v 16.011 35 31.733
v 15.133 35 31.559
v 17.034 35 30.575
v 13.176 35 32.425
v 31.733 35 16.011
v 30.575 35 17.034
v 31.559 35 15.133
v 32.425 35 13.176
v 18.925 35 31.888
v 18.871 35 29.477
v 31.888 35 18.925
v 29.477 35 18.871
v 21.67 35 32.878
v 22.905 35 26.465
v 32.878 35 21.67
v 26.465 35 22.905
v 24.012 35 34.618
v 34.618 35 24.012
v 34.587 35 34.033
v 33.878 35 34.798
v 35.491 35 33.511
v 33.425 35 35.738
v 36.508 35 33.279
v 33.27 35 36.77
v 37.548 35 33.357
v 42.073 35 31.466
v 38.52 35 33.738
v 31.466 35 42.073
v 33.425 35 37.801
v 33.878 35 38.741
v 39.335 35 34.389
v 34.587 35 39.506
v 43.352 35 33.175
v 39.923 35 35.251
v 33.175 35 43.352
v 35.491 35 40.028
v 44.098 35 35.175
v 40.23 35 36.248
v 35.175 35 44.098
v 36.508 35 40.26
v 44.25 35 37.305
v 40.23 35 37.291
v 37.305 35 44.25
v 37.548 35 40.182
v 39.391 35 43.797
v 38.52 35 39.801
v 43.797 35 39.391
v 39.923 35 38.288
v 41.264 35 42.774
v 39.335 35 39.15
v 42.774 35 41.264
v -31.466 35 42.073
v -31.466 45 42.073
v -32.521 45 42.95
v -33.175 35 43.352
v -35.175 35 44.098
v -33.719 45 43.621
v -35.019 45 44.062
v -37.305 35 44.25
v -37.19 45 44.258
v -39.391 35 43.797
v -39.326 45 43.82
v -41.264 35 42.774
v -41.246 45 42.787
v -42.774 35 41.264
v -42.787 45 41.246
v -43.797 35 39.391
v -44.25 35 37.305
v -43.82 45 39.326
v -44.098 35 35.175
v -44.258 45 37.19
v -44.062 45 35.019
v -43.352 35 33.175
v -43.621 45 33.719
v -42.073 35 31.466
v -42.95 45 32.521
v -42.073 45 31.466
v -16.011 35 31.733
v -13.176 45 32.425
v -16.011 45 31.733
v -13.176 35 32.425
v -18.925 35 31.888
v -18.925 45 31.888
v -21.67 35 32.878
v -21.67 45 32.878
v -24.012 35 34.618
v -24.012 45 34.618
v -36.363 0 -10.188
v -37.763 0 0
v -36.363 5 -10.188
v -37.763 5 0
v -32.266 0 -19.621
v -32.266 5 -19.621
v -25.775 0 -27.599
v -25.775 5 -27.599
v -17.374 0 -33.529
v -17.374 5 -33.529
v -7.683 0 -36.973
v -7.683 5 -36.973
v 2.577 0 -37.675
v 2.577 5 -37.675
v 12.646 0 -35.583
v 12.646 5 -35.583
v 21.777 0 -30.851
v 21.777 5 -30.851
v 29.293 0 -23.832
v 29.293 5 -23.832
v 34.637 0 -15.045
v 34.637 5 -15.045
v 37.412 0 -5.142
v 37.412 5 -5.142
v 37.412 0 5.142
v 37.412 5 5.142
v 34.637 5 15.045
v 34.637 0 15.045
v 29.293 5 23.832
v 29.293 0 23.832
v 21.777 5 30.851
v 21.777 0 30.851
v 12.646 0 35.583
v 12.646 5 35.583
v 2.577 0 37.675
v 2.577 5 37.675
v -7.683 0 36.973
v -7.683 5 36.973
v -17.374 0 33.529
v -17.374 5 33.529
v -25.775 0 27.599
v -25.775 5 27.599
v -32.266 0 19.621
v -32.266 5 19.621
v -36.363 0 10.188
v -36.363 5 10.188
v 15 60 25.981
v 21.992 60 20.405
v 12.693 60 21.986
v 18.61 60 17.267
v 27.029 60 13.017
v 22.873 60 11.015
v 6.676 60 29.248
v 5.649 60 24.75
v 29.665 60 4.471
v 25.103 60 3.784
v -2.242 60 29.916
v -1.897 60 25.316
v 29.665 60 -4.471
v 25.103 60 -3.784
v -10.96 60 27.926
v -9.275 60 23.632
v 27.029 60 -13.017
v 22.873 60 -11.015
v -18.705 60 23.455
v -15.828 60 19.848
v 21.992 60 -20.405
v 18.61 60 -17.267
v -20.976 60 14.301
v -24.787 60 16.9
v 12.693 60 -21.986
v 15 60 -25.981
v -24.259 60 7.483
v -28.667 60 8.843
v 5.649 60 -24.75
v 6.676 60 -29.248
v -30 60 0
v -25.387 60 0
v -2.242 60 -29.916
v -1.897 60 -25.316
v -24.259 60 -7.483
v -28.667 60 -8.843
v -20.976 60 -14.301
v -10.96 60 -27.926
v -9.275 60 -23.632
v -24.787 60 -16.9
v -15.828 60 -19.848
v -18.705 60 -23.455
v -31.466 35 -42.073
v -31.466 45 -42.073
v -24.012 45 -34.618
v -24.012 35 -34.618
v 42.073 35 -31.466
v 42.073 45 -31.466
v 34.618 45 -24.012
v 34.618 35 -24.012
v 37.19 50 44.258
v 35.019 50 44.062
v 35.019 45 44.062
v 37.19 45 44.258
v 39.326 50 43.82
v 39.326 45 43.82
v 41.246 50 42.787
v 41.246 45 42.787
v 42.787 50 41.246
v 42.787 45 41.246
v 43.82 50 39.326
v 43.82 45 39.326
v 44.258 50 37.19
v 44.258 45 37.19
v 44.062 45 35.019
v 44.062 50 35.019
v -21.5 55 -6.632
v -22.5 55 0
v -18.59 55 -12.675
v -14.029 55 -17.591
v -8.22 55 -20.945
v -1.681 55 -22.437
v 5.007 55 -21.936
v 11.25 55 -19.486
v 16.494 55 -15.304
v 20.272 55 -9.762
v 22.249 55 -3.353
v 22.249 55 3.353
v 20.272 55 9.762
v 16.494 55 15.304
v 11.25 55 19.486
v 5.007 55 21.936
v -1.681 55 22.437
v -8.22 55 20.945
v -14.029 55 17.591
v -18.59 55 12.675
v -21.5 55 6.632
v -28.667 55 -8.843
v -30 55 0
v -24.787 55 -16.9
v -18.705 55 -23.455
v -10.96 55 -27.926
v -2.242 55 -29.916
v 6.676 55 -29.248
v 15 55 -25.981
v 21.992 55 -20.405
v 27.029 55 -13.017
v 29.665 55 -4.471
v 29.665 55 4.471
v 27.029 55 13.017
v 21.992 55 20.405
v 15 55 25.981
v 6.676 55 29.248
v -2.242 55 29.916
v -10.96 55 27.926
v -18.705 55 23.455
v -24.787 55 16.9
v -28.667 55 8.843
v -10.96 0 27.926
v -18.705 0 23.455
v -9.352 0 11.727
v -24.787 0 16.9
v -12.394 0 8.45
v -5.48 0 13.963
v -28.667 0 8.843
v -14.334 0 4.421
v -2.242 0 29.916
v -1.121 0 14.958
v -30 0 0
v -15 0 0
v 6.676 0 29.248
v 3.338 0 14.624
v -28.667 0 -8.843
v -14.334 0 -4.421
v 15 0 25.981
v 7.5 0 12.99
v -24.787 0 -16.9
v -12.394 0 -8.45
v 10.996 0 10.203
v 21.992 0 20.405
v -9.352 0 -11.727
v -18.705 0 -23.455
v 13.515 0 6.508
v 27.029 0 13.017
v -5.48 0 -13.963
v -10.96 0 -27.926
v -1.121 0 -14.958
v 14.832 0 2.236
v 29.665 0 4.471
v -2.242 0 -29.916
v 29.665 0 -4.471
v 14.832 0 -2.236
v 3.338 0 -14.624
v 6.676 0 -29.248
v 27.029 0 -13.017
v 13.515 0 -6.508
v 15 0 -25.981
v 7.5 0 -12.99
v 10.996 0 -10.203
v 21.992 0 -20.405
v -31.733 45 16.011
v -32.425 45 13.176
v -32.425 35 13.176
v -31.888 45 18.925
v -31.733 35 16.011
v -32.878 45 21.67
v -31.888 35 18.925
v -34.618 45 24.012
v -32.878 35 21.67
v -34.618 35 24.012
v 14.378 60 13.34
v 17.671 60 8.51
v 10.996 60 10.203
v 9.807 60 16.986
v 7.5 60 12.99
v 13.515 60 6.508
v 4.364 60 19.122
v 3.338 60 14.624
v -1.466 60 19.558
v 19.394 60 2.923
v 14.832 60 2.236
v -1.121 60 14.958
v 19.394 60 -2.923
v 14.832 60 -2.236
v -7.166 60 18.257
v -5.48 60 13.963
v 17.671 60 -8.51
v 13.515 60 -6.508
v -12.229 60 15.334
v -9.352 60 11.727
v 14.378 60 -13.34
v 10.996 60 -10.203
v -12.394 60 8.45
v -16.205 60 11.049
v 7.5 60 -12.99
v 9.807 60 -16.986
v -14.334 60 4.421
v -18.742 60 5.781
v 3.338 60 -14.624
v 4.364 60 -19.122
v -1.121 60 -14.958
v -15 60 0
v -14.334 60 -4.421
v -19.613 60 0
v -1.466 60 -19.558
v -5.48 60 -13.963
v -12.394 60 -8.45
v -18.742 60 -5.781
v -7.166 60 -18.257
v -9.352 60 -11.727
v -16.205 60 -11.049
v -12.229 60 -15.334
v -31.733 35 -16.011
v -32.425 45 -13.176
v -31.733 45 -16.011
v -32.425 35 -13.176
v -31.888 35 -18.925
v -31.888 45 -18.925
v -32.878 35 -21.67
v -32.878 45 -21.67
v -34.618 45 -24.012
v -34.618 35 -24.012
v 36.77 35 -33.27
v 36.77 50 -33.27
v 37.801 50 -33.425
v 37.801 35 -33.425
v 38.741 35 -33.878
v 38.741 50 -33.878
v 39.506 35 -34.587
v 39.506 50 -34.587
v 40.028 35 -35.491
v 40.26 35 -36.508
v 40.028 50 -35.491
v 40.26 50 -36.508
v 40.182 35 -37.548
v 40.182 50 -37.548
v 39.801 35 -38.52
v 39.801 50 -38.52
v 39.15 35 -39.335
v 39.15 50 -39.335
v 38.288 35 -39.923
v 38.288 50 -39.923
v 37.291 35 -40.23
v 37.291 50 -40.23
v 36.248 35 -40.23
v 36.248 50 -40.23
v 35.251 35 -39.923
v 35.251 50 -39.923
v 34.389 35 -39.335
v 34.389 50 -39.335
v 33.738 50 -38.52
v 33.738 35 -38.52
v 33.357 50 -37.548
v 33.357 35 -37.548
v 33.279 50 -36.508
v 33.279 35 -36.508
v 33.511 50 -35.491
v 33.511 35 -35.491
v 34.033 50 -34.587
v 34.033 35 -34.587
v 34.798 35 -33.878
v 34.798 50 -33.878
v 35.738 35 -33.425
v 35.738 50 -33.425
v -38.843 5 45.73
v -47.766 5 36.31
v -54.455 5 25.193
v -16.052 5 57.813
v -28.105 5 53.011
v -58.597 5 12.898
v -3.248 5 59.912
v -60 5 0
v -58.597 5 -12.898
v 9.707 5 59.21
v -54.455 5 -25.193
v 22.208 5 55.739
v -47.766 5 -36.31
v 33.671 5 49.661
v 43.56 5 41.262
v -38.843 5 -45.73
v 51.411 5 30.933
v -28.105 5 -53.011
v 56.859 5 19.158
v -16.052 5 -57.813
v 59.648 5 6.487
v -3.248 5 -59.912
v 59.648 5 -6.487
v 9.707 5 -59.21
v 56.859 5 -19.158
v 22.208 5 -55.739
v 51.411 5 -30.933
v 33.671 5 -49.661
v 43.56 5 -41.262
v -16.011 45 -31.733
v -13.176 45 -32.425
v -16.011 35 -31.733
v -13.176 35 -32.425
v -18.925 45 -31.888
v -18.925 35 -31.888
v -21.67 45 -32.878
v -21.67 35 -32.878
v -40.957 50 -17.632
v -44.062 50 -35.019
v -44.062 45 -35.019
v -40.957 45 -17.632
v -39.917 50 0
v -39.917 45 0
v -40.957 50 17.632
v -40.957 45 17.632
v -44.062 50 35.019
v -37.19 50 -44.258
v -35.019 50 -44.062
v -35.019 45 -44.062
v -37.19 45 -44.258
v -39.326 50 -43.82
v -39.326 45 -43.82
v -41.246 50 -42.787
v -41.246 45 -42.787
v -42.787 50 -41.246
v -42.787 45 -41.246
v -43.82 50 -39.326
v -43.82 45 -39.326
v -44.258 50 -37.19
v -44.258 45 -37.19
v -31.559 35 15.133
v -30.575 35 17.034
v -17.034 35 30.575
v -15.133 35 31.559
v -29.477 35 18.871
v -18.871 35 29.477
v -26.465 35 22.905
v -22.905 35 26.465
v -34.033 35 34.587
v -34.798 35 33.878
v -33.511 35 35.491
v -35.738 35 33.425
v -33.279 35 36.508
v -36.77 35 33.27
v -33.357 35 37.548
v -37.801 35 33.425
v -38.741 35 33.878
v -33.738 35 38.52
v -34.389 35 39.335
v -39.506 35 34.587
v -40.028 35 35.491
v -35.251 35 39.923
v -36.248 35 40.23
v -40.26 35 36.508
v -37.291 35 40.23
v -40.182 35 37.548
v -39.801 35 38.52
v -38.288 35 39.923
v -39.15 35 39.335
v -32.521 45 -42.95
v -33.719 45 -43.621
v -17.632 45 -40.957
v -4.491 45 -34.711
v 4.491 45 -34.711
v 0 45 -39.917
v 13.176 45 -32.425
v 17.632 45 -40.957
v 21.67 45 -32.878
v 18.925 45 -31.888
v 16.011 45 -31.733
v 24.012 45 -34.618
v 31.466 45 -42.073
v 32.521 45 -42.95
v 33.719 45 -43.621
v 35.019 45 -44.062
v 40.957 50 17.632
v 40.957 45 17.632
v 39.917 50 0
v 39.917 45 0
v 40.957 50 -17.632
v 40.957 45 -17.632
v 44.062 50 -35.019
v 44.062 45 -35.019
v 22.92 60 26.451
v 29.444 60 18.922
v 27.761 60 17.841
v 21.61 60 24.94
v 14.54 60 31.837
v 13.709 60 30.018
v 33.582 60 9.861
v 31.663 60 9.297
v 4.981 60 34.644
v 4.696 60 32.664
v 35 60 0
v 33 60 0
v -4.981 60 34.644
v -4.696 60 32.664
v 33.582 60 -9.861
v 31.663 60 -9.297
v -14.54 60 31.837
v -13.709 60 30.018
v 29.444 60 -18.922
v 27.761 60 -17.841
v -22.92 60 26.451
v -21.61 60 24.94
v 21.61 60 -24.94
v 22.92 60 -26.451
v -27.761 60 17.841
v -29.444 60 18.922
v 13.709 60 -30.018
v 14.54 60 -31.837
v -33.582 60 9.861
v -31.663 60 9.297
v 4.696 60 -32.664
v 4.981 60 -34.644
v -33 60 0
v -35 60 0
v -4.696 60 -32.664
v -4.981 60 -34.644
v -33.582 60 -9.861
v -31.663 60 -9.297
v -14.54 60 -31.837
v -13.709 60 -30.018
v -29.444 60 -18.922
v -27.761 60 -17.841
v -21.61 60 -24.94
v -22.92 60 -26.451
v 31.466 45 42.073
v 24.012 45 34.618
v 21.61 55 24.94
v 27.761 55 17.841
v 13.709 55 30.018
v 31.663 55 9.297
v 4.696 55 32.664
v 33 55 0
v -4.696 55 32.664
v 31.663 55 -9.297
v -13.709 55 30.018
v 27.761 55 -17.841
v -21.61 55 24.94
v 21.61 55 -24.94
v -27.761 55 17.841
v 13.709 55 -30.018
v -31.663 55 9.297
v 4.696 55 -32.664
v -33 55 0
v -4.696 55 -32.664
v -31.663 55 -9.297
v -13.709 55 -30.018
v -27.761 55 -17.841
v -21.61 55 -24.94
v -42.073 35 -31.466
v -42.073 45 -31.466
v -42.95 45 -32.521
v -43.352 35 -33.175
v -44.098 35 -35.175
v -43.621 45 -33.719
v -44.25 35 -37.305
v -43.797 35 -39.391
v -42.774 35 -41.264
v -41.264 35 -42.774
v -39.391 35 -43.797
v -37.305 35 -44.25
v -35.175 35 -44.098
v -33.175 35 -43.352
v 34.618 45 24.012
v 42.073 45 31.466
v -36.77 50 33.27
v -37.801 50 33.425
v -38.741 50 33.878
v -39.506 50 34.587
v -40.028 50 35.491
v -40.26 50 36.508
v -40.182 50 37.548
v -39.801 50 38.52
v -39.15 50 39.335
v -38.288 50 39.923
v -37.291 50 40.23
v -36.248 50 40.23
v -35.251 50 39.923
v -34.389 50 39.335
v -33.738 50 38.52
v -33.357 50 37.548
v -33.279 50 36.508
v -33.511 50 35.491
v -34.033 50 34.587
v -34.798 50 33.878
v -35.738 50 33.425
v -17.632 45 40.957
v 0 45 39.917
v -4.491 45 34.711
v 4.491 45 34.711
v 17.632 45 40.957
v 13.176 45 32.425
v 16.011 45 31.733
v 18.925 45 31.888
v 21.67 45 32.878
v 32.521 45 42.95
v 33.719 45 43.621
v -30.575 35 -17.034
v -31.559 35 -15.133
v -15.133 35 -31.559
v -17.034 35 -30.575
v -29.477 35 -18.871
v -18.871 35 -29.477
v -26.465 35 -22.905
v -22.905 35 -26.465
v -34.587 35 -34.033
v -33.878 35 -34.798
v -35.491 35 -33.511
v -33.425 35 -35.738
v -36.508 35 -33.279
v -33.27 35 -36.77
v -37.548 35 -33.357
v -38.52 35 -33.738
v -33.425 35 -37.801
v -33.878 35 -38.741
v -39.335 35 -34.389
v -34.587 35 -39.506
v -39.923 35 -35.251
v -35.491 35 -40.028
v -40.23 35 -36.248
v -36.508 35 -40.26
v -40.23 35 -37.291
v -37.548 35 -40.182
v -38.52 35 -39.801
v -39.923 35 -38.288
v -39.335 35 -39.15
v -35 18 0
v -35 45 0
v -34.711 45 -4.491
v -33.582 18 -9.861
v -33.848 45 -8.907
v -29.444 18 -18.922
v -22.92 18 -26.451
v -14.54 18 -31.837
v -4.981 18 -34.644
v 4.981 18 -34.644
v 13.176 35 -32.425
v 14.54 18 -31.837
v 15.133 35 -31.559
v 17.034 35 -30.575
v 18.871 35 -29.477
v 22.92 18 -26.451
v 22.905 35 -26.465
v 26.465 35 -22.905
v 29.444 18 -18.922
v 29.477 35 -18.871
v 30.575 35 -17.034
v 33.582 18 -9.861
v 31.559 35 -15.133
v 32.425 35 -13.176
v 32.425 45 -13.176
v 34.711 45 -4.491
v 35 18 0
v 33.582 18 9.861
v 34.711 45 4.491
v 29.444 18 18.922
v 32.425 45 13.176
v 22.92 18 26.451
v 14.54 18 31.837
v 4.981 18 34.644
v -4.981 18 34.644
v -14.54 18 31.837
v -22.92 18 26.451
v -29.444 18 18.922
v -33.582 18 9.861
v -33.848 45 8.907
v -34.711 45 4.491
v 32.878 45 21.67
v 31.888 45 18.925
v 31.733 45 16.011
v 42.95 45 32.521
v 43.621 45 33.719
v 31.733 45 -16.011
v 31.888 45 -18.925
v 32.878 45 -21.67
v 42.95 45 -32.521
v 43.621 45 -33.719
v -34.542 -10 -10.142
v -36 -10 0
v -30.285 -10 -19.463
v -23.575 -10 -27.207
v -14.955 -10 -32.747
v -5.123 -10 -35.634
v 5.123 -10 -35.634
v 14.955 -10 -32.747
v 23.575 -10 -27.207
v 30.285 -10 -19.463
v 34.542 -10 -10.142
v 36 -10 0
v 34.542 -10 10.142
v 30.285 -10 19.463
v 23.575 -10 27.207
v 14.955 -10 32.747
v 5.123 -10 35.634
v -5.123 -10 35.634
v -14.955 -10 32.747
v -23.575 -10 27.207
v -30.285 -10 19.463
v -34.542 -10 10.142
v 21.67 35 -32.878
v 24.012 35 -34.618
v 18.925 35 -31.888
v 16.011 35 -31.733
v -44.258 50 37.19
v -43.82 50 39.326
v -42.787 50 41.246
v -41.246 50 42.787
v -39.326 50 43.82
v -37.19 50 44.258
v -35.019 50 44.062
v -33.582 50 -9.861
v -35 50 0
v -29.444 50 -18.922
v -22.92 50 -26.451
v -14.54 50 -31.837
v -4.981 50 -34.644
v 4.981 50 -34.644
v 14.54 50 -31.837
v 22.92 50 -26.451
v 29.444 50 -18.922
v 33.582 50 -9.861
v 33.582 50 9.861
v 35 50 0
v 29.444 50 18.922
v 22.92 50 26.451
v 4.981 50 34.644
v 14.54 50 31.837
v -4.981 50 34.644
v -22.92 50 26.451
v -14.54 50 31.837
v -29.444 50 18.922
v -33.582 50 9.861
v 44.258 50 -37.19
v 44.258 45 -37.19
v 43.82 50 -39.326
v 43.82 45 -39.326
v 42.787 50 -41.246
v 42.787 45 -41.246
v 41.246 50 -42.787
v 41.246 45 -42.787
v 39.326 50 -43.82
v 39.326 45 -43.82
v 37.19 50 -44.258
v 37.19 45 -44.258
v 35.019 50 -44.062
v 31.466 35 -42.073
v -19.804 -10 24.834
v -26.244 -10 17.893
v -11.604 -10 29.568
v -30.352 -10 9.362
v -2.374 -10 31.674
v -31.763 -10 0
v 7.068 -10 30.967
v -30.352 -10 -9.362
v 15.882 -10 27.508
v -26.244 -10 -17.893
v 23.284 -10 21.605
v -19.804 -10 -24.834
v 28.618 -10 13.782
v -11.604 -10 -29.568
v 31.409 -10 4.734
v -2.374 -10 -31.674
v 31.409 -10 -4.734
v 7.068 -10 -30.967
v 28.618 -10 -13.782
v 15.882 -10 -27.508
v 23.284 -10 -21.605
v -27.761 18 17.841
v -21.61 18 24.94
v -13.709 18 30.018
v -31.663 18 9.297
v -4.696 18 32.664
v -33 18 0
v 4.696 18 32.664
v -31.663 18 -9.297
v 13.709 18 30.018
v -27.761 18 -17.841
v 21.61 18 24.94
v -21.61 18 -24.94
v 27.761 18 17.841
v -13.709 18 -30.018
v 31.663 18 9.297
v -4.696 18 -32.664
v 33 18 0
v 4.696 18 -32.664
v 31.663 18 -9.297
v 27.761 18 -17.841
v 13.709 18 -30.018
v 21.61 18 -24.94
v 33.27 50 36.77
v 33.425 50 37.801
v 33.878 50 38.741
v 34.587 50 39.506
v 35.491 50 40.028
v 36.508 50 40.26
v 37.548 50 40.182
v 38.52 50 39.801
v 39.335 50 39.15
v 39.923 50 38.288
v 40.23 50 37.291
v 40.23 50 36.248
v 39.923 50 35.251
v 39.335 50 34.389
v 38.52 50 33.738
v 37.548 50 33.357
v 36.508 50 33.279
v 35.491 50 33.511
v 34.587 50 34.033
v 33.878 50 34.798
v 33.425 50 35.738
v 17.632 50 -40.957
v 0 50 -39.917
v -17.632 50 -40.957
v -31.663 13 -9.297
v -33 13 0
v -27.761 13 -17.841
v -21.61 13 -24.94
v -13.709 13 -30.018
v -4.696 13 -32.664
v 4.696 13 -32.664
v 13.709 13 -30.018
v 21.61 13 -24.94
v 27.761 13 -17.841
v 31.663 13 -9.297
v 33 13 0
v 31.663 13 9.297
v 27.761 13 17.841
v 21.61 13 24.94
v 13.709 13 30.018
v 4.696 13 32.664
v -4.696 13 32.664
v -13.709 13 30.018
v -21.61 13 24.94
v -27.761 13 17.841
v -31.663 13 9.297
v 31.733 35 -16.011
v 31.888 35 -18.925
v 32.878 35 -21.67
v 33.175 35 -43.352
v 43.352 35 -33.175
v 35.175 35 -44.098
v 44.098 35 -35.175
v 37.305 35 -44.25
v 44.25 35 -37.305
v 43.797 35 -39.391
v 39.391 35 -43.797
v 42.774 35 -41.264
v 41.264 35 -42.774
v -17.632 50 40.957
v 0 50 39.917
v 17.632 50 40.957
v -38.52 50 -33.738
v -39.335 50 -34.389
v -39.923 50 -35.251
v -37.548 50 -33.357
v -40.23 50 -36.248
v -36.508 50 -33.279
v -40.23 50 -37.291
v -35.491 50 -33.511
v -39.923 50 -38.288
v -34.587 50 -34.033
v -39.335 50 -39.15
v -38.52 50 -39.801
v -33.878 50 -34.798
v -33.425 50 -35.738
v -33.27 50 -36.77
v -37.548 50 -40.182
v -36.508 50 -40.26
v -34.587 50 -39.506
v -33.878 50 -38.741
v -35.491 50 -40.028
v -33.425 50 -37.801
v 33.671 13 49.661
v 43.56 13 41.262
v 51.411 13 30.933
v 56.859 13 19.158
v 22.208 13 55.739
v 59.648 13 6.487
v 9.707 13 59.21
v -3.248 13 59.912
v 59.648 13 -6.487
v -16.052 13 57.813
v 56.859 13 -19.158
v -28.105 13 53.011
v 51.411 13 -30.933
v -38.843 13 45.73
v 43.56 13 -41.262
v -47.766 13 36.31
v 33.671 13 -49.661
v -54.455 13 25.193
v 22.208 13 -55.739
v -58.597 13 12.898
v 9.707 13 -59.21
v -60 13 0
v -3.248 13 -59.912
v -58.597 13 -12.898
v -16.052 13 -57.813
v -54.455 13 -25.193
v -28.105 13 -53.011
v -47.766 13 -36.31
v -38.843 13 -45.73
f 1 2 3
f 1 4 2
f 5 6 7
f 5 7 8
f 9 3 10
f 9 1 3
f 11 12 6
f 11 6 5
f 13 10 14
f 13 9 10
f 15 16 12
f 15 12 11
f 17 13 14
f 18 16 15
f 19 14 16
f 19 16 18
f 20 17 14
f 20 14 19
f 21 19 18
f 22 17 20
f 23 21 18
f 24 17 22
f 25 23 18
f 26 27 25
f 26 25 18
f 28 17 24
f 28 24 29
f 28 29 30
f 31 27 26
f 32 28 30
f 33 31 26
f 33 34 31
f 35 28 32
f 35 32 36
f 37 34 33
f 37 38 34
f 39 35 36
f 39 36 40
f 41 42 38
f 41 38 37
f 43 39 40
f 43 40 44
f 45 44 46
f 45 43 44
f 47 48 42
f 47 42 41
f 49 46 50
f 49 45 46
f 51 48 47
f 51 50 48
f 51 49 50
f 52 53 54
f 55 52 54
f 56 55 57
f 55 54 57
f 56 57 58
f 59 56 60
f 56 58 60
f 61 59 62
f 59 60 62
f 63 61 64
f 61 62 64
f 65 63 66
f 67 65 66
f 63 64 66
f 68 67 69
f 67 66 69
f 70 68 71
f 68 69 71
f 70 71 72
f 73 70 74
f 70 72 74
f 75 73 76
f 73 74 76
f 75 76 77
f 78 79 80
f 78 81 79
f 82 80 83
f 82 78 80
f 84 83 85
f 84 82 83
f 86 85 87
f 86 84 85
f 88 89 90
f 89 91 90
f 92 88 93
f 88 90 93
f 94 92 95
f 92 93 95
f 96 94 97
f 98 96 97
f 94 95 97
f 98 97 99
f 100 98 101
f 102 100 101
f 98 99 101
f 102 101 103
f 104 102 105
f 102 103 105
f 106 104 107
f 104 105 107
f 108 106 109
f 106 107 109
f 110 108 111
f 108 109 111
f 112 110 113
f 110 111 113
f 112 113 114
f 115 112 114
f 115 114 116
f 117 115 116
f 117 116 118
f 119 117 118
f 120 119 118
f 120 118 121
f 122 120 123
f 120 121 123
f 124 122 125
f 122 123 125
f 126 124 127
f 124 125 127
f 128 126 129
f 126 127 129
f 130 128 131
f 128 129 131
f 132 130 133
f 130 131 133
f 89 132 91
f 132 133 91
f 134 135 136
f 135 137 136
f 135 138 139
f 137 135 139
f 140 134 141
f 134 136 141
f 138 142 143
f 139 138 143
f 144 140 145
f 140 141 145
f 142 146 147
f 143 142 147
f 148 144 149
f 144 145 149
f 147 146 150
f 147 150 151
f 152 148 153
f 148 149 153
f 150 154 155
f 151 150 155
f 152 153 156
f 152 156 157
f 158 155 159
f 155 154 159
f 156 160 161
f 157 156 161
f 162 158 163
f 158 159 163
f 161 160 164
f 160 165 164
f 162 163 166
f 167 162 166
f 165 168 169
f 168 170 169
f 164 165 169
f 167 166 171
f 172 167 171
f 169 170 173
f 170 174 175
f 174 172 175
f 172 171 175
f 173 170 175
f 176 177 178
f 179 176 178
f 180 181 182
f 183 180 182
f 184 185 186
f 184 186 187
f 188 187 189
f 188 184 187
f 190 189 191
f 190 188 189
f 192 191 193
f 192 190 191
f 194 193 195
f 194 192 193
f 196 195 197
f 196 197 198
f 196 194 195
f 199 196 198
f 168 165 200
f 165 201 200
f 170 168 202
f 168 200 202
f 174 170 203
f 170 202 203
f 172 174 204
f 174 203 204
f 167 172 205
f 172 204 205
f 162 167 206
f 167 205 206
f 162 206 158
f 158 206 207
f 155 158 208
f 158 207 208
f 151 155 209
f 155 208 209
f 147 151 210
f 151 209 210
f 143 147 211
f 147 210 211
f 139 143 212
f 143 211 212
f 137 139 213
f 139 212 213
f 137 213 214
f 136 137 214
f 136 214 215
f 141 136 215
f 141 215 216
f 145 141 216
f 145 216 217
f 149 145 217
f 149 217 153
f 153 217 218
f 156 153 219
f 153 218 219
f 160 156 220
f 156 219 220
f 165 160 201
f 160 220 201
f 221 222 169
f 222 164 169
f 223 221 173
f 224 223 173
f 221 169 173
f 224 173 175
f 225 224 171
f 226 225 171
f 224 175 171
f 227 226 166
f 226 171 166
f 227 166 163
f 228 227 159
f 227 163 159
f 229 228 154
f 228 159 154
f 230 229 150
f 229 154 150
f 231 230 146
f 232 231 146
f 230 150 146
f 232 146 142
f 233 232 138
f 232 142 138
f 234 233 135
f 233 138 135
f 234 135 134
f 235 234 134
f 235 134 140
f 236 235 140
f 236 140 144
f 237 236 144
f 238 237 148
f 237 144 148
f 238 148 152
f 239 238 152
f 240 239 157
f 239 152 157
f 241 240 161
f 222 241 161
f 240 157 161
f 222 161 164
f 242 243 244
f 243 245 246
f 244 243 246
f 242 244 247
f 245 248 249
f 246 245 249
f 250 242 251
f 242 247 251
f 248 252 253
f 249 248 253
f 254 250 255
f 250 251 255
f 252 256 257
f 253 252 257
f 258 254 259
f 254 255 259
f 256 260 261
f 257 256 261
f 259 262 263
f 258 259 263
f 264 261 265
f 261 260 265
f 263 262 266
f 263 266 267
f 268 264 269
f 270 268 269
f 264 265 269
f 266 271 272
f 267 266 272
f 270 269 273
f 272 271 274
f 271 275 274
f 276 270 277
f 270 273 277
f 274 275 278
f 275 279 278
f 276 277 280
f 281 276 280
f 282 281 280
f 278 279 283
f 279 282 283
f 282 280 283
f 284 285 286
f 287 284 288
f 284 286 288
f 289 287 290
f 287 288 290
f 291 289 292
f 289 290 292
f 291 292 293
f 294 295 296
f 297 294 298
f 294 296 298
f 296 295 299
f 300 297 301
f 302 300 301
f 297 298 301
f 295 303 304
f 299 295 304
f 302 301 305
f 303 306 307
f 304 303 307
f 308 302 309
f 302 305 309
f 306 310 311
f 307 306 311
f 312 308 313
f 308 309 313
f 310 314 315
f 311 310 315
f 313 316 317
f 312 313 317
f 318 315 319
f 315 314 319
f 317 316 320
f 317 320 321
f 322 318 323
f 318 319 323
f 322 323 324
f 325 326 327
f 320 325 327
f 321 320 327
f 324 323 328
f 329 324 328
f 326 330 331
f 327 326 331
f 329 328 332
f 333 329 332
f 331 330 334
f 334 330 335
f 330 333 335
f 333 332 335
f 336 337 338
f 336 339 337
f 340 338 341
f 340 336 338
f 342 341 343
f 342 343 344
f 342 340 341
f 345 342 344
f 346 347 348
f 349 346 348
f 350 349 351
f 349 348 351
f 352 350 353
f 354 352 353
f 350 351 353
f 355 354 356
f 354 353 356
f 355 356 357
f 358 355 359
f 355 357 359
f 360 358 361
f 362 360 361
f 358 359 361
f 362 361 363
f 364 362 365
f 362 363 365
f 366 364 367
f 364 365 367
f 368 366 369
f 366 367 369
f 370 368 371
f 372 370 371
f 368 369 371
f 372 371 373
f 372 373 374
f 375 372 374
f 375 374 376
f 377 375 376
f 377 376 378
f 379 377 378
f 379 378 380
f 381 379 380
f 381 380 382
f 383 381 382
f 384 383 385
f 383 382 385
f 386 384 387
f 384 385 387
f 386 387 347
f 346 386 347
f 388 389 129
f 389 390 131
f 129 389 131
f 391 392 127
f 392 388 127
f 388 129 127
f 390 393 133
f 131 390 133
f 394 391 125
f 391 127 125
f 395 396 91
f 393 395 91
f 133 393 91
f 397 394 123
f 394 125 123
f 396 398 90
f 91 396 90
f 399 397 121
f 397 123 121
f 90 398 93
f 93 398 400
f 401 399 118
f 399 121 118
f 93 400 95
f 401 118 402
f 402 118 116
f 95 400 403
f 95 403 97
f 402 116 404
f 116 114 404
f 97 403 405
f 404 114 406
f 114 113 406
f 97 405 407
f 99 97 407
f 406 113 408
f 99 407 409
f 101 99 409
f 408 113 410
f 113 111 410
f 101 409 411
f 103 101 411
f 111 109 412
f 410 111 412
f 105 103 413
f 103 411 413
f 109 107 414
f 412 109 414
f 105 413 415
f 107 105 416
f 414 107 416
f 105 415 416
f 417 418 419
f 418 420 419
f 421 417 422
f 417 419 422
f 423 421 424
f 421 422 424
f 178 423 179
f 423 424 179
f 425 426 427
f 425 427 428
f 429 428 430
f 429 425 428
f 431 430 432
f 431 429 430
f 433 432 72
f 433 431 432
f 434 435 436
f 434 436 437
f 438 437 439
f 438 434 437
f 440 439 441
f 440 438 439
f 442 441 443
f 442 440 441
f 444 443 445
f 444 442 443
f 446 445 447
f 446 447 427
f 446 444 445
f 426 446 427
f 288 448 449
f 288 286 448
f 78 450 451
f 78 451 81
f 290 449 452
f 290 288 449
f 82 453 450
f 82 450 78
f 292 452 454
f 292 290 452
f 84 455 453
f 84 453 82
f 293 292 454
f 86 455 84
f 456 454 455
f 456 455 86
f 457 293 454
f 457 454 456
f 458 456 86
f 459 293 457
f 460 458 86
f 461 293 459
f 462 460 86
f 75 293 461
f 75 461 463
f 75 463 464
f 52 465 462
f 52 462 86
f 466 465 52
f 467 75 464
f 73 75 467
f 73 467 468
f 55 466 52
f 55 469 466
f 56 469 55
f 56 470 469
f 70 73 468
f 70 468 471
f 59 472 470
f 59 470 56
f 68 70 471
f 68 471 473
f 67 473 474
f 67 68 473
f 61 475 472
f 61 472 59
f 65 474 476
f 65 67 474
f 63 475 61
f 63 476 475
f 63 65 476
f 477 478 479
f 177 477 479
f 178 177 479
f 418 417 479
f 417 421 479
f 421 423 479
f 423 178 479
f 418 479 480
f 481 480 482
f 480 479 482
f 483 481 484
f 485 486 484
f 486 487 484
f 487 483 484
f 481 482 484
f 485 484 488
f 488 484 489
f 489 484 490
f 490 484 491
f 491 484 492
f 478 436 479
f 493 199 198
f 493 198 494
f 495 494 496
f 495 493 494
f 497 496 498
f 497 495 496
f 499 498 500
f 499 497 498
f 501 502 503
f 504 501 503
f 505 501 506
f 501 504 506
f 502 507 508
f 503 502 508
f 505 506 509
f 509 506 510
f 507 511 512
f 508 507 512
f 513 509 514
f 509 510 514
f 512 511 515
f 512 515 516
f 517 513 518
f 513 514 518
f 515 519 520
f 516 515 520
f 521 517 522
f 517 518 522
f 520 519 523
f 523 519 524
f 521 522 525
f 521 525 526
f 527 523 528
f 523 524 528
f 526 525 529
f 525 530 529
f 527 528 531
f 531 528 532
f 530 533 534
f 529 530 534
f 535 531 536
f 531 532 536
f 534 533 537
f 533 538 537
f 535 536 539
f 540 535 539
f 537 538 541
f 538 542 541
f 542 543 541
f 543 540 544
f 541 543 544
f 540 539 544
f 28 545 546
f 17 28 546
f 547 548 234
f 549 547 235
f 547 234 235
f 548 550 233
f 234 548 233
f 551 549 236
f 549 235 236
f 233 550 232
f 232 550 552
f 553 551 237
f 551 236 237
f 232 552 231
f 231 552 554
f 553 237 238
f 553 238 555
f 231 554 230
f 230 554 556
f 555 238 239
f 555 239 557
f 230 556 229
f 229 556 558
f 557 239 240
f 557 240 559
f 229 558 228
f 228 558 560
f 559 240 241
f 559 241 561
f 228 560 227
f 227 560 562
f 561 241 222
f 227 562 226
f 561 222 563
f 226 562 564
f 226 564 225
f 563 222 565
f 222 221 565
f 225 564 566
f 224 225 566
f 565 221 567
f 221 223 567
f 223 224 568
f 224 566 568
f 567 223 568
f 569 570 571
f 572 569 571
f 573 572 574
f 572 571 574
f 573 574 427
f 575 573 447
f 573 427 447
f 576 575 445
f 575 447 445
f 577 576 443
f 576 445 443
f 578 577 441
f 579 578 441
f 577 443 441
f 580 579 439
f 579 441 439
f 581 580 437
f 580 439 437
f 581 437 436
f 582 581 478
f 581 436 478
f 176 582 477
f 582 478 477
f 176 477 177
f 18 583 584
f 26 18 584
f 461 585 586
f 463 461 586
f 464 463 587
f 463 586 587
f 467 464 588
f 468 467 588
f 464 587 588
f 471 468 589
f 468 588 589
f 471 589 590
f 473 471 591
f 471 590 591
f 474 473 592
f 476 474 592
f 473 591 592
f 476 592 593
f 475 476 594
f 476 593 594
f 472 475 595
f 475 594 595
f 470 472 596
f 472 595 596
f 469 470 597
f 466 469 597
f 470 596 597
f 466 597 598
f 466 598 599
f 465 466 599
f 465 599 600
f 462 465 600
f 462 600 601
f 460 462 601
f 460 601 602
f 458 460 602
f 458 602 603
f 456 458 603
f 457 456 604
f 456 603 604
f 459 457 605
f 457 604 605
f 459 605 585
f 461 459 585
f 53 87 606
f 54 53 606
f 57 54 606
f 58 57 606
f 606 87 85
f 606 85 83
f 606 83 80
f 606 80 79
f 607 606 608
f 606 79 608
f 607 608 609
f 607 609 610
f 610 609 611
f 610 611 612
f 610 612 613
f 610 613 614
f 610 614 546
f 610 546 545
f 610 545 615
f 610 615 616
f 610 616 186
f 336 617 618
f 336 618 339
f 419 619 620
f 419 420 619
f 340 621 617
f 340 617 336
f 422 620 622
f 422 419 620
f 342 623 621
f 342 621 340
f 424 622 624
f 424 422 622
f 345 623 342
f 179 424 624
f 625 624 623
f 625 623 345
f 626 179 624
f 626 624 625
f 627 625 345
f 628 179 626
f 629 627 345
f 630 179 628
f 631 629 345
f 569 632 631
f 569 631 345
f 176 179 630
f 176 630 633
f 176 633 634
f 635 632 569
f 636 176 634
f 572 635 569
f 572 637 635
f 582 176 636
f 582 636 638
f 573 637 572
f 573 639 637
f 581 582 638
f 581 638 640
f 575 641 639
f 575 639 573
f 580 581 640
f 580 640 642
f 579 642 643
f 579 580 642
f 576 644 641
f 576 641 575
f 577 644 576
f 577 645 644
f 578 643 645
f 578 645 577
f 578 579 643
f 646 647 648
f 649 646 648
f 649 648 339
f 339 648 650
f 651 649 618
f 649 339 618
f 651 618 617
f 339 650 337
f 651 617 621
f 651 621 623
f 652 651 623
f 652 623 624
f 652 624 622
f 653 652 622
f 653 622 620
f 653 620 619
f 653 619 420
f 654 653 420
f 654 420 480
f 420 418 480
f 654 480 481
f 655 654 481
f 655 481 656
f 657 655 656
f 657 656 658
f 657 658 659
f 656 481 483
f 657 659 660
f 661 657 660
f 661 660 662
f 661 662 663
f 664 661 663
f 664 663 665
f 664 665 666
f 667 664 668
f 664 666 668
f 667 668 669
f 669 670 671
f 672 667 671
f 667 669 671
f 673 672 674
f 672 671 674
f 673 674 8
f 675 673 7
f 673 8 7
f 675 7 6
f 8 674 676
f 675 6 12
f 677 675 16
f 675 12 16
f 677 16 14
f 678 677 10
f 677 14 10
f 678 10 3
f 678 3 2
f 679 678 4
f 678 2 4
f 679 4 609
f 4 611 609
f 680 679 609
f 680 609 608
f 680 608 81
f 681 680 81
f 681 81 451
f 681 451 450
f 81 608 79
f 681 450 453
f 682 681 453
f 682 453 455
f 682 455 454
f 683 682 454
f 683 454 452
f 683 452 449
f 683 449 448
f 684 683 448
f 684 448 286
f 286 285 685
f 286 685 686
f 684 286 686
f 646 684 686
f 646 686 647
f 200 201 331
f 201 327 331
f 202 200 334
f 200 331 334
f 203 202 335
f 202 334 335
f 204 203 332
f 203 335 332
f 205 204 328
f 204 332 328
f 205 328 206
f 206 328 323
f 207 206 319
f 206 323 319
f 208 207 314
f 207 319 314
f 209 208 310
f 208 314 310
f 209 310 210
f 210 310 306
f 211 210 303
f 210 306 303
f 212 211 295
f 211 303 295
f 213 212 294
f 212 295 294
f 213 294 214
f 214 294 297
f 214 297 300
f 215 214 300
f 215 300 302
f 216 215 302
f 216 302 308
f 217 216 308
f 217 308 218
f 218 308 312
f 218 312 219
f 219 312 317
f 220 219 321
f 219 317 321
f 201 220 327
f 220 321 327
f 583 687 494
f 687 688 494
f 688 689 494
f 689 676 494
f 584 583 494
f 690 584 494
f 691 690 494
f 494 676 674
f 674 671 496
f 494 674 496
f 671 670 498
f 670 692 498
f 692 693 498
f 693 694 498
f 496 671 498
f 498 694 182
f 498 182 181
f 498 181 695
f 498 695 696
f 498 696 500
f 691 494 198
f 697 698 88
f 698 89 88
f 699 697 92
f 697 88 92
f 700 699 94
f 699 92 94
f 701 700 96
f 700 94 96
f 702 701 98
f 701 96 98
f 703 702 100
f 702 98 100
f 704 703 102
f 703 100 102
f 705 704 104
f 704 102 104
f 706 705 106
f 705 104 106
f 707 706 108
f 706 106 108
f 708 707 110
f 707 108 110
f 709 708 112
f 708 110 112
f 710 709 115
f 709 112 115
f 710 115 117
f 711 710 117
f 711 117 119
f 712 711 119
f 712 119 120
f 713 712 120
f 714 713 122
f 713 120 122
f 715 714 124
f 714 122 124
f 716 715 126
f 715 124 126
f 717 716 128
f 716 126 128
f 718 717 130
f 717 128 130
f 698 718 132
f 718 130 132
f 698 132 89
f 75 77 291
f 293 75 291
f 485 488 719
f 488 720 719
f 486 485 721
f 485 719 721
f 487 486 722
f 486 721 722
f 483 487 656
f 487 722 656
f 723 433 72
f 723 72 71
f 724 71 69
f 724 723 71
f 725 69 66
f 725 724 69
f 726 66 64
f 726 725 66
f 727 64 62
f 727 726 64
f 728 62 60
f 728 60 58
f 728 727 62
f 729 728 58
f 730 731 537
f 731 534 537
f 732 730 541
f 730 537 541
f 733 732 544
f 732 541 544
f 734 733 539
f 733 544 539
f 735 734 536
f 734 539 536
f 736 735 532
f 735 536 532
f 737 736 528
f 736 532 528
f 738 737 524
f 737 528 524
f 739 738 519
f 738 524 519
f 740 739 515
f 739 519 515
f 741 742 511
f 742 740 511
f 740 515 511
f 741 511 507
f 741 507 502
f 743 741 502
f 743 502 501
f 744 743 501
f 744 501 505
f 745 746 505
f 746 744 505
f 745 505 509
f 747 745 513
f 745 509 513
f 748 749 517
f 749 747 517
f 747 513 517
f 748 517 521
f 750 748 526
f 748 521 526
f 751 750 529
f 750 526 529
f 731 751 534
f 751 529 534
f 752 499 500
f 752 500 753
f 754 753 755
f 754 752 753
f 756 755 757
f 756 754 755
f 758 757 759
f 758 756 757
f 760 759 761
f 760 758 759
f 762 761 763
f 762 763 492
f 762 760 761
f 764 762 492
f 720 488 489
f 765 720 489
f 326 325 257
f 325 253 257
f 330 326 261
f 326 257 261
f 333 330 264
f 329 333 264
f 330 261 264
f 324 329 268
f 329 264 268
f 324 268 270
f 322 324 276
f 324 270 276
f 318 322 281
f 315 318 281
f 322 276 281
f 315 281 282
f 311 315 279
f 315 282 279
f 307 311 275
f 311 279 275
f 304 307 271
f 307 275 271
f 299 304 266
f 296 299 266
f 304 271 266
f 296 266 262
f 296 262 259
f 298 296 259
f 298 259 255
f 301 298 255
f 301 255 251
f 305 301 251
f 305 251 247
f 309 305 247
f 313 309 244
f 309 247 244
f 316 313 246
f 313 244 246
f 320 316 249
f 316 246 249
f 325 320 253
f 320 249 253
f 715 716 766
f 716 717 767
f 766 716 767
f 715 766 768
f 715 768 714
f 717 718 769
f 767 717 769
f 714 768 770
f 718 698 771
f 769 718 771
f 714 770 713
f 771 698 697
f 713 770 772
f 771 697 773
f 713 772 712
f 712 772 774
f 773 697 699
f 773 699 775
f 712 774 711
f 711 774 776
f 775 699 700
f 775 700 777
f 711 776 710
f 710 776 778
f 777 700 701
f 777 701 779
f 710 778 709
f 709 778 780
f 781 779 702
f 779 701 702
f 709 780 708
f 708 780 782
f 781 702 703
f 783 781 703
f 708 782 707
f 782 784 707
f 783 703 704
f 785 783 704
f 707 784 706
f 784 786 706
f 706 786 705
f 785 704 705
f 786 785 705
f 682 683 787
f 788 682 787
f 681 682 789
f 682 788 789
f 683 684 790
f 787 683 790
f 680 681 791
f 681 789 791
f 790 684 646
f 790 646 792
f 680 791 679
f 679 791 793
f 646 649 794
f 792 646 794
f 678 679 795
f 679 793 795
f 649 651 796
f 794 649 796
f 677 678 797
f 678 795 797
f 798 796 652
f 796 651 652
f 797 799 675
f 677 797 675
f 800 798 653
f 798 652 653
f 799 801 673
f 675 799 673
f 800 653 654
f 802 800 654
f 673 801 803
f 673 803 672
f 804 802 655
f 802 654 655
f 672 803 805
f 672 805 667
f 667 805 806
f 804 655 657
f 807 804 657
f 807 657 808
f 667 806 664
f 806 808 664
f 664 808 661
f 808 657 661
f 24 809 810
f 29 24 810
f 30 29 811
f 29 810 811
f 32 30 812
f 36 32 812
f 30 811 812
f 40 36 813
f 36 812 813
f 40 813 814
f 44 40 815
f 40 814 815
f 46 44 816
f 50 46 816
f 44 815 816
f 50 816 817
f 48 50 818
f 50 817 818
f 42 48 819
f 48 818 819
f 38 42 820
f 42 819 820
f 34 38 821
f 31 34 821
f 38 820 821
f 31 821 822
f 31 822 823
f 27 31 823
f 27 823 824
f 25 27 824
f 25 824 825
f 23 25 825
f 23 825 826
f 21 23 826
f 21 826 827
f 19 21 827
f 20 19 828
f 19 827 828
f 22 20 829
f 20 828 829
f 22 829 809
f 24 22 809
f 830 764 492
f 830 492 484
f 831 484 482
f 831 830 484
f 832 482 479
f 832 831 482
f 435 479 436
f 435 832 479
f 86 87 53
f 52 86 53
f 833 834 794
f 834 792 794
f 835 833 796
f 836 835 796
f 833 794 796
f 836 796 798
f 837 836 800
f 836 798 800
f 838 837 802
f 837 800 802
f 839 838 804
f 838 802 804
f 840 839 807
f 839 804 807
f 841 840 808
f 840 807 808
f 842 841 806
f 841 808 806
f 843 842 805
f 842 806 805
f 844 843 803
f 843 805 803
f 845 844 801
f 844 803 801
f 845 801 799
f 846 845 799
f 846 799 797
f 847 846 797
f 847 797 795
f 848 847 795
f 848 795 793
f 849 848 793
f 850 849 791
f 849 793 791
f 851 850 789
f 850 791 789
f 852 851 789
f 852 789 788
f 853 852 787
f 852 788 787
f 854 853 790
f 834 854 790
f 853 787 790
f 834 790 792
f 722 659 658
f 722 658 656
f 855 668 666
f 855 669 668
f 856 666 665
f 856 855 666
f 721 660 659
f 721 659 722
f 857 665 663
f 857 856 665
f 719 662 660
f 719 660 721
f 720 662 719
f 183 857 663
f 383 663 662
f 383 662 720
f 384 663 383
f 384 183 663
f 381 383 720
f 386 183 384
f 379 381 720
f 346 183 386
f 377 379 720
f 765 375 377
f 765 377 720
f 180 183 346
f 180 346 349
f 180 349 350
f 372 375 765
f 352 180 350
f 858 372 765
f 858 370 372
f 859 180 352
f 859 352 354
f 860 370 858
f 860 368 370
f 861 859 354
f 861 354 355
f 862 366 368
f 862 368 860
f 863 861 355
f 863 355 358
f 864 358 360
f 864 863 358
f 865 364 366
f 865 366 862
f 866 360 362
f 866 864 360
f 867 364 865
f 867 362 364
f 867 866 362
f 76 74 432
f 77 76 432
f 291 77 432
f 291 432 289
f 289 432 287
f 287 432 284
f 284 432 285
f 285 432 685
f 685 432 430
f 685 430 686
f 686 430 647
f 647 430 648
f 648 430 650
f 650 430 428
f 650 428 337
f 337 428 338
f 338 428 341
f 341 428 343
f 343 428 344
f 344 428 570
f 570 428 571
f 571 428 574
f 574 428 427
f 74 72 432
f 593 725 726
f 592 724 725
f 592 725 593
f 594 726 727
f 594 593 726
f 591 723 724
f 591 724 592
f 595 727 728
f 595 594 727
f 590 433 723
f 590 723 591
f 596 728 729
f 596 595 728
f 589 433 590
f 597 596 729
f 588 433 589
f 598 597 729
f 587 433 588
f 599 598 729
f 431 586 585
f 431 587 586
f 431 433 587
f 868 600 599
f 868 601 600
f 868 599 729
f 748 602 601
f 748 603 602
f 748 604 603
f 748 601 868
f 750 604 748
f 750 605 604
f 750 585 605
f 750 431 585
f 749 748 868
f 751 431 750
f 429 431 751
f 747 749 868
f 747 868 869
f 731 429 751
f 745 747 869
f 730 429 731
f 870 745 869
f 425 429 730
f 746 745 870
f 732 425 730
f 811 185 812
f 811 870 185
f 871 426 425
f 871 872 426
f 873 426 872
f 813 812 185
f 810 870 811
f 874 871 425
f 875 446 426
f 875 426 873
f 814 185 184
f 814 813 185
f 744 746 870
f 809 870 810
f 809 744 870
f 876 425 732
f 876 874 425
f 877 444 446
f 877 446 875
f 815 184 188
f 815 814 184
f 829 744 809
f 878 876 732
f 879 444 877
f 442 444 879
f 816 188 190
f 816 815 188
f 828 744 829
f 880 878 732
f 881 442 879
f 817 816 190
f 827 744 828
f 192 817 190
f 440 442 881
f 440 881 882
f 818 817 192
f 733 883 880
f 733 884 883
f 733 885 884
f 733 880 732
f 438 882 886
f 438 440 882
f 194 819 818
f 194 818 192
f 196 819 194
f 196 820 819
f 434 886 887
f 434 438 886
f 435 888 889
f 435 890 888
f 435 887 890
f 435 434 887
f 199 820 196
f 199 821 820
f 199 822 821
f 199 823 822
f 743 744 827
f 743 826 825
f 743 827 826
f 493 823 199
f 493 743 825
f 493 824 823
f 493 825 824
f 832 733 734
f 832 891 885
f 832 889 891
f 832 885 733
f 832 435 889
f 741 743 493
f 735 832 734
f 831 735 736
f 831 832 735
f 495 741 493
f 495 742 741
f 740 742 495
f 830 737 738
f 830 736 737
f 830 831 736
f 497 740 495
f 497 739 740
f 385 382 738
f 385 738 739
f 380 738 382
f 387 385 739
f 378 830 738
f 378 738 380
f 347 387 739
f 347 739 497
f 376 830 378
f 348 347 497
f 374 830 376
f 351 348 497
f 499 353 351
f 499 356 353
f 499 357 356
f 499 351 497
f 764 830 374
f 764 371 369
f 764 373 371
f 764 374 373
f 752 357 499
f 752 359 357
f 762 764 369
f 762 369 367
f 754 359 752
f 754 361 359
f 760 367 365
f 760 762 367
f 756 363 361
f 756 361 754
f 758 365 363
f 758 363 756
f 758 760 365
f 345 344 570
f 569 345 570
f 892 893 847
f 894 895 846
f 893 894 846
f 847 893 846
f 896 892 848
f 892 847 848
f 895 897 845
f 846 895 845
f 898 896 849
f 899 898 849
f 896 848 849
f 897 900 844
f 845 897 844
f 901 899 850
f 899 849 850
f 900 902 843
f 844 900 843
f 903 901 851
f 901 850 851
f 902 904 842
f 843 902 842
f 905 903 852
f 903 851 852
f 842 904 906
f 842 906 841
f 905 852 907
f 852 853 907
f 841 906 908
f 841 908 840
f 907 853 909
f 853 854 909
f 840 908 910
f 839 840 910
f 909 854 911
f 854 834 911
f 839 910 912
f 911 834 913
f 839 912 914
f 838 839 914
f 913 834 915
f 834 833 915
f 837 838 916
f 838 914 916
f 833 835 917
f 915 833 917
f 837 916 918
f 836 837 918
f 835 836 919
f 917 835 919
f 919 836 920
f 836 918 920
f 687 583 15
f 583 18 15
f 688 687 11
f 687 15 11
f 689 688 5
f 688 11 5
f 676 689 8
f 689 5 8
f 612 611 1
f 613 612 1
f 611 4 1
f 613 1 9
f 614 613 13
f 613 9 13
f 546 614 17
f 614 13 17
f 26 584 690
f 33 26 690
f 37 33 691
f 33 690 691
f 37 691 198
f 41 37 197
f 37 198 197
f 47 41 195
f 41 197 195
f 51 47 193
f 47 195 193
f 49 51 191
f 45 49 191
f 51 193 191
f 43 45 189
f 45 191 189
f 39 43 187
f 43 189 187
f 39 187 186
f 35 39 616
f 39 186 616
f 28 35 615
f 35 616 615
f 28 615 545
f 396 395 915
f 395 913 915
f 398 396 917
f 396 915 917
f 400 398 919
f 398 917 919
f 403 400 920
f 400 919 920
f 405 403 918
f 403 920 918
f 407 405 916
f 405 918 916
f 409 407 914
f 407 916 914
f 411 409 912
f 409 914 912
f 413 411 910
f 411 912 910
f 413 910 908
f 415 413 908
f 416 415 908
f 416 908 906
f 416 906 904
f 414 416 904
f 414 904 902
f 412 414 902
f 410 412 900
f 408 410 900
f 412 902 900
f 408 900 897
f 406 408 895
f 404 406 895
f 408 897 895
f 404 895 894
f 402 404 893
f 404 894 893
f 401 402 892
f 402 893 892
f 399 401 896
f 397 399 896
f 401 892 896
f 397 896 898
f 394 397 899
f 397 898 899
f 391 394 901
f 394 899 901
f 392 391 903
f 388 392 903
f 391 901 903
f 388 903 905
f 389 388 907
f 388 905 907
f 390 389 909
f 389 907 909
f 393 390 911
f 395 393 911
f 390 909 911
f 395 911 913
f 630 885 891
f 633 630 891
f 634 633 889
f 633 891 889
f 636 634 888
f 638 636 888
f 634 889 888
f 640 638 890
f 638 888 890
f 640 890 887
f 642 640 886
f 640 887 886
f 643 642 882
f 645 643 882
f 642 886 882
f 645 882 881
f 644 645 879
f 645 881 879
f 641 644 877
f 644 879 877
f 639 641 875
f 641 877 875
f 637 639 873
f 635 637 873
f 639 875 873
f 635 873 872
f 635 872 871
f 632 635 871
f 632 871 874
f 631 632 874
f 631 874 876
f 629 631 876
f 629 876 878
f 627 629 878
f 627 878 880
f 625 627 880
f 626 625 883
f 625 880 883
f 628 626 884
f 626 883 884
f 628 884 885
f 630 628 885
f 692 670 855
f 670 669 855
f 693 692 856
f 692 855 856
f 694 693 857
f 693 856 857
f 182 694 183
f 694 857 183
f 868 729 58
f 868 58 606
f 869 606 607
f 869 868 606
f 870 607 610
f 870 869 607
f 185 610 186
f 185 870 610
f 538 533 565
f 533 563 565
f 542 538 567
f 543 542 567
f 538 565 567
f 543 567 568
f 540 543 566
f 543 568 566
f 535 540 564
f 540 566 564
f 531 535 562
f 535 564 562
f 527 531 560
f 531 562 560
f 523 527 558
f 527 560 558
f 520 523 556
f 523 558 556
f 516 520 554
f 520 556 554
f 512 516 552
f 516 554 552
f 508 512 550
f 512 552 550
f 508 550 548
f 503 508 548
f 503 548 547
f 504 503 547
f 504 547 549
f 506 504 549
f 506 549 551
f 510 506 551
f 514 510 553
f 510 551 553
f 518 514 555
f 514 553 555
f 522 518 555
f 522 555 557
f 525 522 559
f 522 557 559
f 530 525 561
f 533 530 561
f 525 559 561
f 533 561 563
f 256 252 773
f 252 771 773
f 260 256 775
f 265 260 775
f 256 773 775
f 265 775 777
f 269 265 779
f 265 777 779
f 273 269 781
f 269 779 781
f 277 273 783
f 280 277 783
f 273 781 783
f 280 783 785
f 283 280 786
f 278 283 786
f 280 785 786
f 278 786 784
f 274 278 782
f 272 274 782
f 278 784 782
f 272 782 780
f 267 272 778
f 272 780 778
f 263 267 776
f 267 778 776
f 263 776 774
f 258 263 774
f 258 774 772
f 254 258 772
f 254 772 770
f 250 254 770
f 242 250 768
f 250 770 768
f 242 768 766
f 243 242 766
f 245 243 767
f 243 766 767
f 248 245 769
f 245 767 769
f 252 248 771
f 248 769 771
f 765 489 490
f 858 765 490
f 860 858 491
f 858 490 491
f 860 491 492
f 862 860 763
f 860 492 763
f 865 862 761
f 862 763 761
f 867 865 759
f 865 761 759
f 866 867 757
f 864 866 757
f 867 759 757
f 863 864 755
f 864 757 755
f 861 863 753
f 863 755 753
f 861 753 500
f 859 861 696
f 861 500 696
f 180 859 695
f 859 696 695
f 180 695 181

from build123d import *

# Parameters (mm, degrees)
SKETCH3_R                = 35
BOSS_EXTRUDE1_DEPTH      = 5
BOSS_EXTRUDE3_DEPTH      = 10
FILLET1_R                = 10
SKETCH5_R                = 3.5
CUT_EXTRUDE1_DEPTH       = 15
CIRPATTERN1_COUNT        = 4
FILLET1_OF_CIRPATTERN1_R = 10


with BuildPart() as part:
    # Sketch1 → Revolve1 (revolve)
    with BuildSketch(Plane.XY, mode=Mode.PRIVATE) as revolve1_sk:
        Polygon((15, 60), (15, 0), (30, 0), (31.763269807, -10), (36, -10), (37.763269807, 0), (37.763269807, 5), (60, 5), (60, 13), (33, 13), (33, 18), (35, 18), (35, 60), (33, 60), (33, 55), (30, 55), (30, 60), (25.386751346, 60), (22.5, 55), (19.613248654, 60), align=None)
    revolve(revolve1_sk.sketch.rotate(Axis((0, 25.612491422, 0), (0, -1, 0)), 180), axis=Axis((0, 25.612491422, 0), (0, -1, 0)))  # turned: the seam where the file's is

    # Sketch3 → Boss-Extrude1 (add)
    with BuildSketch(Plane(origin=(0, 50, 0), x_dir=(1, 0, 0), z_dir=(0, 1, 0))):
        with BuildLine():
            ThreePointArc((44.062305213, 35.018621544), (42.072853481, 42.072853481), (35.018621544, 44.062305213))
            ThreePointArc((35.018621544, 44.062305213), (0, 39.917357046), (-35.018621544, 44.062305213))
            ThreePointArc((-35.018621544, 44.062305213), (-42.072853481, 42.072853481), (-44.062305213, 35.018621544))
            ThreePointArc((-44.062305213, 35.018621544), (-39.917357046, 0), (-44.062305213, -35.018621544))
            ThreePointArc((-44.062305213, -35.018621544), (-42.072853481, -42.072853481), (-35.018621544, -44.062305213))
            ThreePointArc((-35.018621544, -44.062305213), (0, -39.917357046), (35.018621544, -44.062305213))
            ThreePointArc((35.018621544, -44.062305213), (42.072853481, -42.072853481), (44.062305213, -35.018621544))
            ThreePointArc((44.062305213, -35.018621544), (39.917357046, 0), (44.062305213, 35.018621544))
        make_face()
        with Locations(Location((0, 0, 0), (0, 0, 180))):  # turned: the seam where the file's is
            Circle(SKETCH3_R, mode=Mode.SUBTRACT)
    extrude(amount=-BOSS_EXTRUDE1_DEPTH)

    # Sketch4 → Boss-Extrude3 (add)
    with BuildSketch(Plane.XZ.offset(-45)):
        with BuildLine():
            Line((29.477150366, 18.870548648), (42.072853481, 31.466251763))
            ThreePointArc((42.072853481, 31.466251763), (42.072853481, 42.072853481), (31.466251763, 42.072853481))
            Line((31.466251763, 42.072853481), (18.870548648, 29.477150366))
            ThreePointArc((18.870548648, 29.477150366), (24.748737342, 24.748737342), (29.477150366, 18.870548648))
        make_face()
    boss_extrude3 = extrude(amount=BOSS_EXTRUDE3_DEPTH)

    # Fillet1
    fillet1_edges = [part.edges().sort_by_distance(p)[0] for p in [
        (18.870548648, 40, 29.477150366),
        (29.477150366, 40, 18.870548648),
    ]]
    fillet(fillet1_edges, radius=FILLET1_R)

    # Sketch5 → Cut-Extrude1 (cut)
    with BuildSketch(Plane(origin=(0, 50, 0), x_dir=(1, 0, 0), z_dir=(0, 1, 0))):
        with Locations(Location((36.769552622, -36.769552622, 0), (0, 0, 180))):  # turned: the seam where the file's is
            Circle(SKETCH5_R)
    cut_extrude1 = extrude(amount=-CUT_EXTRUDE1_DEPTH, mode=Mode.SUBTRACT)

    # CirPattern1: Boss-Extrude3, Cut-Extrude1 ×4 about axis
    cirpattern1_axis = Axis((0, 0, 0), (0, 1, 0))
    add([boss_extrude3.rotate(cirpattern1_axis, i * 360 / CIRPATTERN1_COUNT) for i in range(1, CIRPATTERN1_COUNT)])
    add([cut_extrude1.rotate(cirpattern1_axis, i * 360 / CIRPATTERN1_COUNT) for i in range(1, CIRPATTERN1_COUNT)], mode=Mode.SUBTRACT)

    # Fillet1 of CirPattern1
    fillet1_of_cirpattern1_edges = [part.edges().sort_by_distance(p)[0] for p in [
        (29.477150366, 40, -18.870548648),
        (18.870548648, 40, -29.477150366),
        (-18.870548648, 40, -29.477150366),
        (-29.477150366, 40, -18.870548648),
        (-29.477150366, 40, 18.870548648),
        (-18.870548648, 40, 29.477150366),
    ]]
    fillet(fillet1_of_cirpattern1_edges, radius=FILLET1_OF_CIRPATTERN1_R)


solid = part.part
